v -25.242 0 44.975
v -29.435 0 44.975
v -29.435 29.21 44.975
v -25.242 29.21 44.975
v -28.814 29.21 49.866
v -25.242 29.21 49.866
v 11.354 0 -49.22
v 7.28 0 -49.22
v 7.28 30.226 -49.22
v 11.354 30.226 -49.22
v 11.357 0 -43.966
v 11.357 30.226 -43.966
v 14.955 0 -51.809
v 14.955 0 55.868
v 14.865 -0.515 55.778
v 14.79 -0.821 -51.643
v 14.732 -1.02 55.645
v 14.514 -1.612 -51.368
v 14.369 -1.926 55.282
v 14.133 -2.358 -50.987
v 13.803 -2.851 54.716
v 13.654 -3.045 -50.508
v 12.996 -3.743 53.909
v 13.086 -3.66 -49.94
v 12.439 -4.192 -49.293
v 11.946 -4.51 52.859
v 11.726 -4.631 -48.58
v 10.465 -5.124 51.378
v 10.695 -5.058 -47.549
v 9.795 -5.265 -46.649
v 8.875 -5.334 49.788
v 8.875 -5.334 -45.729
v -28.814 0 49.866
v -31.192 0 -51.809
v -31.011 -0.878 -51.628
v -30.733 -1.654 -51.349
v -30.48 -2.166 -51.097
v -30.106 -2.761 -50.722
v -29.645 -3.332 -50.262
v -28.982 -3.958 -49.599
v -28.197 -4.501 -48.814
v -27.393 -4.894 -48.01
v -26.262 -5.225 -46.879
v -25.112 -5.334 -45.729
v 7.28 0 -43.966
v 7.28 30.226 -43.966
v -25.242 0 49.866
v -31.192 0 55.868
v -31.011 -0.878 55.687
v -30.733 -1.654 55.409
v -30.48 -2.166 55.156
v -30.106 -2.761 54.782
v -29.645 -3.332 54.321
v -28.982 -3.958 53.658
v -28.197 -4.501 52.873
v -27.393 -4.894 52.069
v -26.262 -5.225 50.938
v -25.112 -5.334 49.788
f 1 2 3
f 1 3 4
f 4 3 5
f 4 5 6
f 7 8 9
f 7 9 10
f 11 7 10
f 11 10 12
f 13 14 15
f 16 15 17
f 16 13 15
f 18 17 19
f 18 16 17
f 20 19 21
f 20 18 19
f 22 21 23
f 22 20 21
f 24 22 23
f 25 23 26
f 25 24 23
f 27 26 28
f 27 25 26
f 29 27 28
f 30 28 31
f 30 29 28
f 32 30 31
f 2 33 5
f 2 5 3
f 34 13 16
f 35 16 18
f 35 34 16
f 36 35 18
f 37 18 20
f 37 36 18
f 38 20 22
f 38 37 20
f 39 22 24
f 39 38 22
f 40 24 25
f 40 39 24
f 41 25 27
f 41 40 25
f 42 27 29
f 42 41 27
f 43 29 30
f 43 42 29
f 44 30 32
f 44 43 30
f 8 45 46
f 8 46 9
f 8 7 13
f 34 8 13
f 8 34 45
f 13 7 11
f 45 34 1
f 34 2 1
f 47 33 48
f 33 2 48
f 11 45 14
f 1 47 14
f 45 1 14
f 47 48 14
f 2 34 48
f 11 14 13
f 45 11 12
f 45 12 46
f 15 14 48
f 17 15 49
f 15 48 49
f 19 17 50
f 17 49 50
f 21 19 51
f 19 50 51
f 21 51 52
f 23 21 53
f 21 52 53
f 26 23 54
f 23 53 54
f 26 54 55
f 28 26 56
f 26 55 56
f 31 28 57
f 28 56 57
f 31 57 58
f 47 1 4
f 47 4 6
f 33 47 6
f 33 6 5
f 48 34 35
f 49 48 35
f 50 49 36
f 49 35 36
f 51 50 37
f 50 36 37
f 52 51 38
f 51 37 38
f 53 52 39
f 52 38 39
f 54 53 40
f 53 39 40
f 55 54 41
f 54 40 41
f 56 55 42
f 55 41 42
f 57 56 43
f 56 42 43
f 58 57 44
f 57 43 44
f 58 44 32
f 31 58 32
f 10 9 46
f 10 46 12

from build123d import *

# Parameters (mm, degrees)
F0_W        = 46.1472896859
F0_H        = 107.677012682
F1_DEPTH    = 5.334
F2_T1_DEPTH = 76.5470071681
F2_T3_DEPTH = 138.0767301641
F6_DEPTH    = 29.21
F8_DEPTH    = 30.226


# Not quite as in the source:
# - a fillet or chamfer that OpenCascade refuses, or shapes differently, is made with other operations: its cross-section is extruded or revolved along the edge and cut away or added
# - the program builds the solid bodies; features that only make, move or delete a surface that nothing else refers to are left out


with BuildPart() as f1:
    # F0 (on Front) → F1 (new body)
    with BuildSketch(Plane.XZ):
        with Locations((-8.118505124, 2.0296275616)):
            Rectangle(F0_W, F0_H)
    extrude(amount=F1_DEPTH)

    # F2: fillet of radius 6.1321024484 on 4 edges, made by hand

    # F2_s2 → F2_t1 (cut)
    with BuildSketch(Plane.YZ.offset(-46.392008708)):
        with BuildLine():
            ThreePointArc((0, 55.8681339025), (-3.8114922418, 53.8322375411), (-5.334, 49.7881904061))
            Line((-5.334, 49.7881904061), (-5.334, 55.8681339025))
            Line((-5.334, 55.8681339025), (0, 55.8681339025))
        make_face()
        with BuildLine():
            ThreePointArc((0, -51.8088787794), (-3.8114922418, -49.772982418), (-5.334, -45.728935283))
            Line((-5.334, -45.728935283), (-5.334, -51.8088787794))
            Line((-5.334, -51.8088787794), (0, -51.8088787794))
        make_face()
    extrude(amount=F2_T1_DEPTH, mode=Mode.SUBTRACT)

    # F2_s4 → F2_t3 (cut)
    with BuildSketch(Plane.XY.offset(-67.0087375205)):
        with BuildLine():
            ThreePointArc((-31.192149967, 0), (-29.1562536055, -3.8114922418), (-25.1122064705, -5.334))
            Line((-25.1122064705, -5.334), (-31.192149967, -5.334))
            Line((-31.192149967, -5.334), (-31.192149967, 0))
        make_face()
        with BuildLine():
            ThreePointArc((14.9551397189, 0), (12.9192433575, -3.8114922418), (8.8751962225, -5.334))
            Line((8.8751962225, -5.334), (14.9551397189, -5.334))
            Line((14.9551397189, -5.334), (14.9551397189, 0))
        make_face()
    extrude(amount=F2_T3_DEPTH, mode=Mode.SUBTRACT)

    # F5 (on Front) → F6 (join)
    with BuildSketch(Plane.XZ):
        Polygon((-25.2416264266, 49.8663634062), (-28.8135651499, 49.8663634062), (-29.4354222715, 44.9747443199), (-25.2416264266, 44.9747443199), align=None)
    extrude(amount=-F6_DEPTH)

    # F7 (on Front) → F8 (join)
    with BuildSketch(Plane.XZ):
        Polygon((11.3538028672, -49.219802022), (11.3571733236, -43.9655184746), (7.279606536, -43.9655184746), (7.279606536, -49.219802022), align=None)
    extrude(amount=-F8_DEPTH)


solid = f1.part
